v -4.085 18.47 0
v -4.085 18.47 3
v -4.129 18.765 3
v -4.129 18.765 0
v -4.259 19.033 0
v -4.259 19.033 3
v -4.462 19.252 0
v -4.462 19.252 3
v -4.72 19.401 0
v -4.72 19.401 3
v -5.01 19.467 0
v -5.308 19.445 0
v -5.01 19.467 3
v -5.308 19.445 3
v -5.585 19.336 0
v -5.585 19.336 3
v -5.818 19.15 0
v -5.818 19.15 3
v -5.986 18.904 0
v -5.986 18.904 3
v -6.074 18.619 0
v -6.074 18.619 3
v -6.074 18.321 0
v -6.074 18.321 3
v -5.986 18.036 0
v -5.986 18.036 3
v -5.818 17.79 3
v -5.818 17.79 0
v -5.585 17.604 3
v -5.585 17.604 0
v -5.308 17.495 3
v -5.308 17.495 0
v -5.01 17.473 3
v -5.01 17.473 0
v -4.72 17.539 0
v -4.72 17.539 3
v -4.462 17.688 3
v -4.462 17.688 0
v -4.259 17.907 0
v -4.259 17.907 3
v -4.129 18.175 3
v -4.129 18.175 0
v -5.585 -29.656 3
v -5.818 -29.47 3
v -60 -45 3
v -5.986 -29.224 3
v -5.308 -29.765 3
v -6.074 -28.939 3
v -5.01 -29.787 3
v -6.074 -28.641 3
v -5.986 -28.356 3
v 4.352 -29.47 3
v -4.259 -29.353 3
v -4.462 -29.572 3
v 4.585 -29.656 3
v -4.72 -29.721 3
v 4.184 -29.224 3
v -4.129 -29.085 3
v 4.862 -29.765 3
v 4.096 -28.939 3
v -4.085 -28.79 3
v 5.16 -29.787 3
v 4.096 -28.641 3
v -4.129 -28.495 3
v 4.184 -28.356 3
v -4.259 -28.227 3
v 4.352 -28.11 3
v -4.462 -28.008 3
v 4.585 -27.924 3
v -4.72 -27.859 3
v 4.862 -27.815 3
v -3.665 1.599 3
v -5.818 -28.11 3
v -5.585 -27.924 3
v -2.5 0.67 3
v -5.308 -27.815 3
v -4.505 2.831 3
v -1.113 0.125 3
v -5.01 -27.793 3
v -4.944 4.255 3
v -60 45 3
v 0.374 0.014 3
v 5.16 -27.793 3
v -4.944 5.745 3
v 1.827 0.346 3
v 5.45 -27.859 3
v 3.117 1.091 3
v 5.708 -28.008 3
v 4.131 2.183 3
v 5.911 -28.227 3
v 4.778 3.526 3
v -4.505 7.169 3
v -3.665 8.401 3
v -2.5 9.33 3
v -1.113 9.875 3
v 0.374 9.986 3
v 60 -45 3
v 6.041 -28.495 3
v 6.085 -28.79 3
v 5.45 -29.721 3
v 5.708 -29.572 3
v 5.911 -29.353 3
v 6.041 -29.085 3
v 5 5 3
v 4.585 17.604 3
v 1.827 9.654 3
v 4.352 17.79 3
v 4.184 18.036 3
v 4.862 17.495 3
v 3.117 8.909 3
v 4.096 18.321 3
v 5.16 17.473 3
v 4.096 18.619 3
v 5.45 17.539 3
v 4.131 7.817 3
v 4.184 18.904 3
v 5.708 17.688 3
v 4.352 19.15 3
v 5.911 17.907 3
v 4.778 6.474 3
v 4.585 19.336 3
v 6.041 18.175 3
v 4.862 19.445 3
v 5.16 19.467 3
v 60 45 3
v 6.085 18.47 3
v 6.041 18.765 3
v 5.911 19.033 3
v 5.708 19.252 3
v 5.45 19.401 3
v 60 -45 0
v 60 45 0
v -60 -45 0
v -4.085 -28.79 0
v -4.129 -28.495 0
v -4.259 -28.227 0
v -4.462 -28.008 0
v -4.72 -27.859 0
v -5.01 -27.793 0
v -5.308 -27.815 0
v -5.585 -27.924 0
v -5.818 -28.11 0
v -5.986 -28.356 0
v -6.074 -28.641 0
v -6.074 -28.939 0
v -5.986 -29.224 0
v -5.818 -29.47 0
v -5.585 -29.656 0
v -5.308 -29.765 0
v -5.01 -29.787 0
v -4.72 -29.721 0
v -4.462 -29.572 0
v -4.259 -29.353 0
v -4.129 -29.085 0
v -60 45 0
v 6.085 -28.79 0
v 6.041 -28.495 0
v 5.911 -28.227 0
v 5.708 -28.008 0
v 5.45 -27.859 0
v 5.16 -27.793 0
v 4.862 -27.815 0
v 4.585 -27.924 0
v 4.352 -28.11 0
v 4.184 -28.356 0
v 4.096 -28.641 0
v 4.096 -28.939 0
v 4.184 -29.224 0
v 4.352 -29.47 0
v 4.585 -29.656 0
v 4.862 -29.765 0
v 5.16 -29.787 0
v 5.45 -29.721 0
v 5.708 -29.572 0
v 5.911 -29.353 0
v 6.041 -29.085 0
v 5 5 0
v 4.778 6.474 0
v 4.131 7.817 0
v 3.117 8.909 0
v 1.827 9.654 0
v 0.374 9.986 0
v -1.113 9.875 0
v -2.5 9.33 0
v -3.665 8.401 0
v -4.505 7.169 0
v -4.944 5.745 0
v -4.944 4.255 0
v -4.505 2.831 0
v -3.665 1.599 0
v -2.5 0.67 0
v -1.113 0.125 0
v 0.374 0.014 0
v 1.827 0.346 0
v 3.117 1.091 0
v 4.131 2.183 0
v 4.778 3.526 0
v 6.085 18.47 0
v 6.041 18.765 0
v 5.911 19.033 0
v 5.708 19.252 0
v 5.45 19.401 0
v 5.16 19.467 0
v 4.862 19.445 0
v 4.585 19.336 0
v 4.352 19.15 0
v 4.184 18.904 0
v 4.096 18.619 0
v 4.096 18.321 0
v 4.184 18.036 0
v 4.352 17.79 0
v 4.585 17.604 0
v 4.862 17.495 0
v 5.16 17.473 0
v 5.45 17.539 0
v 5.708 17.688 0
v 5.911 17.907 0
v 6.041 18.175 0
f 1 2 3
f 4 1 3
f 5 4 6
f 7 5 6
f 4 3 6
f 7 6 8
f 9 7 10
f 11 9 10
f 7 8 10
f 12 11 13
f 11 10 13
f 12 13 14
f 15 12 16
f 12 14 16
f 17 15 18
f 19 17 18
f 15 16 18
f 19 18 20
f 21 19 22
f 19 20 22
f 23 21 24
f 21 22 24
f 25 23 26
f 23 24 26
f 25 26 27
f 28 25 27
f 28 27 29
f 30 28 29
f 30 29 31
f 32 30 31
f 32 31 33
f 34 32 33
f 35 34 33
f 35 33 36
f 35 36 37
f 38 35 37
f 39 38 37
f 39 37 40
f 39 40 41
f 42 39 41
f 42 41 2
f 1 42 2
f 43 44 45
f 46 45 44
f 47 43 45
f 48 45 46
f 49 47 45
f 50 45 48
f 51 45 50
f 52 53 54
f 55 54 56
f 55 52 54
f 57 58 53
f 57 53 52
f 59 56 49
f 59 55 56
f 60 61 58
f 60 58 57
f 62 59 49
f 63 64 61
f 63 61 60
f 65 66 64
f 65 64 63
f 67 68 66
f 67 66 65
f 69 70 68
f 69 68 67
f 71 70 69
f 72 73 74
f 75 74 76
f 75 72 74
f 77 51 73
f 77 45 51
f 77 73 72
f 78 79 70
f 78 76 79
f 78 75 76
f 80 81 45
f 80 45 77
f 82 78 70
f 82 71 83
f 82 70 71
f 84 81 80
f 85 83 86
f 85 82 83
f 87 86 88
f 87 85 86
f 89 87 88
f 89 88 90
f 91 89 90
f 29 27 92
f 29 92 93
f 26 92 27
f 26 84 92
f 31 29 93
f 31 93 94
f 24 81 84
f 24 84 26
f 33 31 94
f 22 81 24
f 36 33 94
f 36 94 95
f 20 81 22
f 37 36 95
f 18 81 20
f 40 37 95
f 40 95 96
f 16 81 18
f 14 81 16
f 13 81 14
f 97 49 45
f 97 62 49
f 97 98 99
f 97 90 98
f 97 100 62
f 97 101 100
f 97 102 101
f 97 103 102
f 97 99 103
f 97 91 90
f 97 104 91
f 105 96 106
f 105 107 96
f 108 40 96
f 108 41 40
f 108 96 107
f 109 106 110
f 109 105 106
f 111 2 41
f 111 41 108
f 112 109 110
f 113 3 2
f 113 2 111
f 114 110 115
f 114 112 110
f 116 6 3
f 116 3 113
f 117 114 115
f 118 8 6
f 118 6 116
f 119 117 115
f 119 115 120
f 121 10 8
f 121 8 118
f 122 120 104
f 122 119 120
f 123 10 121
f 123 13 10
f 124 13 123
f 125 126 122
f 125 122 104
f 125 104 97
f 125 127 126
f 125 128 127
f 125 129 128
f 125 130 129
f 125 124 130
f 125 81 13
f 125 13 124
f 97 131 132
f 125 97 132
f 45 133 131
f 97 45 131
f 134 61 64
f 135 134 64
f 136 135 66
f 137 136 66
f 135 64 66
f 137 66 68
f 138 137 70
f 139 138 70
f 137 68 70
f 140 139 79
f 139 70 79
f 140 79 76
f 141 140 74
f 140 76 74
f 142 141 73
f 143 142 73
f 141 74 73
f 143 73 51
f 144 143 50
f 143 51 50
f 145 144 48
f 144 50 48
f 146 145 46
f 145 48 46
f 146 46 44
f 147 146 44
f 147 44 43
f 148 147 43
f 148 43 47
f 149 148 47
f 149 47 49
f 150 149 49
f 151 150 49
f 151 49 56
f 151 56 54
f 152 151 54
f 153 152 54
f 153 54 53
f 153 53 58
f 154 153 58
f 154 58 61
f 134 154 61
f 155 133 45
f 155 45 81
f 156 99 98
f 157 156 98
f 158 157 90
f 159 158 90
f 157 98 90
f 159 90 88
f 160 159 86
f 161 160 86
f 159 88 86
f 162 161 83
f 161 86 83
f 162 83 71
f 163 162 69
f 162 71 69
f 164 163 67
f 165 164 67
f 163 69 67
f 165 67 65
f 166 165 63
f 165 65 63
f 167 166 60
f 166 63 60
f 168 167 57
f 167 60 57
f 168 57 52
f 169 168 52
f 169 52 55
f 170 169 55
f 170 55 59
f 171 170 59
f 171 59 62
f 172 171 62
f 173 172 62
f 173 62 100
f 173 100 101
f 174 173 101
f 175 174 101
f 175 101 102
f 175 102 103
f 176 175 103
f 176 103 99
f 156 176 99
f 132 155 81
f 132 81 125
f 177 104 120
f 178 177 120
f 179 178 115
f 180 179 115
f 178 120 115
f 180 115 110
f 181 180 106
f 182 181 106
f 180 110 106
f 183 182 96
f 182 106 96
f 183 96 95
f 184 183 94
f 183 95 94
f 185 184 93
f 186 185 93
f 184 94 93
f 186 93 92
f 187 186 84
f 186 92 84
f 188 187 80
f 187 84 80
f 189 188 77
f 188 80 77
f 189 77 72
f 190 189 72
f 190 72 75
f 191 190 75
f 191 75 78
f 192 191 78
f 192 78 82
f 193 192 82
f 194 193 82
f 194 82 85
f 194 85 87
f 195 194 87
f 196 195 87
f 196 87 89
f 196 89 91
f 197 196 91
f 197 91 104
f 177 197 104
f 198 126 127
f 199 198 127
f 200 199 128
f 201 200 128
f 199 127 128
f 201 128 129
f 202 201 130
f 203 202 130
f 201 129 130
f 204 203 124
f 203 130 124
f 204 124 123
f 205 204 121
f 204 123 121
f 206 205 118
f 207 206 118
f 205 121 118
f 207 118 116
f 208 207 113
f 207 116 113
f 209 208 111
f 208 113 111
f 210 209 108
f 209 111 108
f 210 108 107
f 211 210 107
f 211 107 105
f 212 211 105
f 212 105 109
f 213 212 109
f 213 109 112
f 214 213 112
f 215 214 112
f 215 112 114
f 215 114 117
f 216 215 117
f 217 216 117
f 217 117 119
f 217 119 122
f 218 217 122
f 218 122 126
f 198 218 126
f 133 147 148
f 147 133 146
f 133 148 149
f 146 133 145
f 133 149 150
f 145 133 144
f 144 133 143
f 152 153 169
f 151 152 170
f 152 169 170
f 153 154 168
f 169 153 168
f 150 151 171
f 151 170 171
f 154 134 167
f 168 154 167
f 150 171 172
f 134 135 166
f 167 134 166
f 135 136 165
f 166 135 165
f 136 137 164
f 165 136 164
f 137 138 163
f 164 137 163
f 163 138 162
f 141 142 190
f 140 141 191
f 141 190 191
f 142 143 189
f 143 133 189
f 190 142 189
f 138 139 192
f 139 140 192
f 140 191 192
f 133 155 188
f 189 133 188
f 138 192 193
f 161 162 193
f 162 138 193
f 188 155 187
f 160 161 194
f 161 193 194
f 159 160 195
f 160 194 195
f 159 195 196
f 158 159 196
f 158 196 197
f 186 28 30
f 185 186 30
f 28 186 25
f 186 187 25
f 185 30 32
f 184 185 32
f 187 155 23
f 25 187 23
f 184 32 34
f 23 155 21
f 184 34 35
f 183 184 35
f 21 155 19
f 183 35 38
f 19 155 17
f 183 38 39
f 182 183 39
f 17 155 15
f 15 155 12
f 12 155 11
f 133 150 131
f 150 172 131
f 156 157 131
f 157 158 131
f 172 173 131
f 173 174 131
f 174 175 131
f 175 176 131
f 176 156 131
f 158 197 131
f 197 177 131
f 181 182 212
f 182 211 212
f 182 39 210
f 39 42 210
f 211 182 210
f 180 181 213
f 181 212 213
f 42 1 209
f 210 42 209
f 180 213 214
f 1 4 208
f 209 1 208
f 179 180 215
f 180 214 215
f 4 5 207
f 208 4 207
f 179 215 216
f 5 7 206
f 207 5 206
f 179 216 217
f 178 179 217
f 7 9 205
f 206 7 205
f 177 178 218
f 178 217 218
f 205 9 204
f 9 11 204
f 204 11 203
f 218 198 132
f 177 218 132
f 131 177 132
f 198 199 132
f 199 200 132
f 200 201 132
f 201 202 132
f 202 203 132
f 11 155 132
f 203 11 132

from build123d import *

# Parameters (mm, degrees)
F0_W     = 120
F0_H     = 90
F0_R     = 1
F0_R_2   = 5
F1_DEPTH = 3
F2_R     = 5
F2_R_2   = 1
F3_DEPTH = 3.001


with BuildPart() as f1:
    # F0 (on Top) → F1 (new body)
    with BuildSketch(Plane.XY):
        Rectangle(F0_W, F0_H)
        with Locations((-5.085, -18.47)):
            Circle(F0_R, mode=Mode.SUBTRACT)
        with Locations((5.09234, -18.47)):
            Circle(F0_R, mode=Mode.SUBTRACT)
        with Locations((0, -5)):
            Circle(F0_R_2, mode=Mode.SUBTRACT)
        with Locations((-5.085, 28.79)):
            Circle(F0_R, mode=Mode.SUBTRACT)
        with Locations((5.09234, 28.79)):
            Circle(F0_R, mode=Mode.SUBTRACT)
        with Locations((0, -5)):
            Circle(F0_R_2)
        with Locations((5.09234, 28.79)):
            Circle(F0_R)
        with Locations((-5.085, 28.79)):
            Circle(F0_R)
        with Locations((-5.085, -18.47)):
            Circle(F0_R)
        with Locations((5.09234, -18.47)):
            Circle(F0_R)
    extrude(amount=F1_DEPTH)

    # F2 (on face) → F3 (cut, through all)
    with BuildSketch(Plane.XY.offset(3)):
        with Locations((0, 5)):
            Circle(F2_R)
        with Locations((5.085, -28.79)):
            Circle(F2_R_2)
        with Locations((-5.085, -28.79)):
            Circle(F2_R_2)
        with Locations((5.085, 18.47)):
            Circle(F2_R_2)
        with Locations((-5.085, 18.47)):
            Circle(F2_R_2)
    extrude(amount=-F3_DEPTH, mode=Mode.SUBTRACT)


solid = f1.part
